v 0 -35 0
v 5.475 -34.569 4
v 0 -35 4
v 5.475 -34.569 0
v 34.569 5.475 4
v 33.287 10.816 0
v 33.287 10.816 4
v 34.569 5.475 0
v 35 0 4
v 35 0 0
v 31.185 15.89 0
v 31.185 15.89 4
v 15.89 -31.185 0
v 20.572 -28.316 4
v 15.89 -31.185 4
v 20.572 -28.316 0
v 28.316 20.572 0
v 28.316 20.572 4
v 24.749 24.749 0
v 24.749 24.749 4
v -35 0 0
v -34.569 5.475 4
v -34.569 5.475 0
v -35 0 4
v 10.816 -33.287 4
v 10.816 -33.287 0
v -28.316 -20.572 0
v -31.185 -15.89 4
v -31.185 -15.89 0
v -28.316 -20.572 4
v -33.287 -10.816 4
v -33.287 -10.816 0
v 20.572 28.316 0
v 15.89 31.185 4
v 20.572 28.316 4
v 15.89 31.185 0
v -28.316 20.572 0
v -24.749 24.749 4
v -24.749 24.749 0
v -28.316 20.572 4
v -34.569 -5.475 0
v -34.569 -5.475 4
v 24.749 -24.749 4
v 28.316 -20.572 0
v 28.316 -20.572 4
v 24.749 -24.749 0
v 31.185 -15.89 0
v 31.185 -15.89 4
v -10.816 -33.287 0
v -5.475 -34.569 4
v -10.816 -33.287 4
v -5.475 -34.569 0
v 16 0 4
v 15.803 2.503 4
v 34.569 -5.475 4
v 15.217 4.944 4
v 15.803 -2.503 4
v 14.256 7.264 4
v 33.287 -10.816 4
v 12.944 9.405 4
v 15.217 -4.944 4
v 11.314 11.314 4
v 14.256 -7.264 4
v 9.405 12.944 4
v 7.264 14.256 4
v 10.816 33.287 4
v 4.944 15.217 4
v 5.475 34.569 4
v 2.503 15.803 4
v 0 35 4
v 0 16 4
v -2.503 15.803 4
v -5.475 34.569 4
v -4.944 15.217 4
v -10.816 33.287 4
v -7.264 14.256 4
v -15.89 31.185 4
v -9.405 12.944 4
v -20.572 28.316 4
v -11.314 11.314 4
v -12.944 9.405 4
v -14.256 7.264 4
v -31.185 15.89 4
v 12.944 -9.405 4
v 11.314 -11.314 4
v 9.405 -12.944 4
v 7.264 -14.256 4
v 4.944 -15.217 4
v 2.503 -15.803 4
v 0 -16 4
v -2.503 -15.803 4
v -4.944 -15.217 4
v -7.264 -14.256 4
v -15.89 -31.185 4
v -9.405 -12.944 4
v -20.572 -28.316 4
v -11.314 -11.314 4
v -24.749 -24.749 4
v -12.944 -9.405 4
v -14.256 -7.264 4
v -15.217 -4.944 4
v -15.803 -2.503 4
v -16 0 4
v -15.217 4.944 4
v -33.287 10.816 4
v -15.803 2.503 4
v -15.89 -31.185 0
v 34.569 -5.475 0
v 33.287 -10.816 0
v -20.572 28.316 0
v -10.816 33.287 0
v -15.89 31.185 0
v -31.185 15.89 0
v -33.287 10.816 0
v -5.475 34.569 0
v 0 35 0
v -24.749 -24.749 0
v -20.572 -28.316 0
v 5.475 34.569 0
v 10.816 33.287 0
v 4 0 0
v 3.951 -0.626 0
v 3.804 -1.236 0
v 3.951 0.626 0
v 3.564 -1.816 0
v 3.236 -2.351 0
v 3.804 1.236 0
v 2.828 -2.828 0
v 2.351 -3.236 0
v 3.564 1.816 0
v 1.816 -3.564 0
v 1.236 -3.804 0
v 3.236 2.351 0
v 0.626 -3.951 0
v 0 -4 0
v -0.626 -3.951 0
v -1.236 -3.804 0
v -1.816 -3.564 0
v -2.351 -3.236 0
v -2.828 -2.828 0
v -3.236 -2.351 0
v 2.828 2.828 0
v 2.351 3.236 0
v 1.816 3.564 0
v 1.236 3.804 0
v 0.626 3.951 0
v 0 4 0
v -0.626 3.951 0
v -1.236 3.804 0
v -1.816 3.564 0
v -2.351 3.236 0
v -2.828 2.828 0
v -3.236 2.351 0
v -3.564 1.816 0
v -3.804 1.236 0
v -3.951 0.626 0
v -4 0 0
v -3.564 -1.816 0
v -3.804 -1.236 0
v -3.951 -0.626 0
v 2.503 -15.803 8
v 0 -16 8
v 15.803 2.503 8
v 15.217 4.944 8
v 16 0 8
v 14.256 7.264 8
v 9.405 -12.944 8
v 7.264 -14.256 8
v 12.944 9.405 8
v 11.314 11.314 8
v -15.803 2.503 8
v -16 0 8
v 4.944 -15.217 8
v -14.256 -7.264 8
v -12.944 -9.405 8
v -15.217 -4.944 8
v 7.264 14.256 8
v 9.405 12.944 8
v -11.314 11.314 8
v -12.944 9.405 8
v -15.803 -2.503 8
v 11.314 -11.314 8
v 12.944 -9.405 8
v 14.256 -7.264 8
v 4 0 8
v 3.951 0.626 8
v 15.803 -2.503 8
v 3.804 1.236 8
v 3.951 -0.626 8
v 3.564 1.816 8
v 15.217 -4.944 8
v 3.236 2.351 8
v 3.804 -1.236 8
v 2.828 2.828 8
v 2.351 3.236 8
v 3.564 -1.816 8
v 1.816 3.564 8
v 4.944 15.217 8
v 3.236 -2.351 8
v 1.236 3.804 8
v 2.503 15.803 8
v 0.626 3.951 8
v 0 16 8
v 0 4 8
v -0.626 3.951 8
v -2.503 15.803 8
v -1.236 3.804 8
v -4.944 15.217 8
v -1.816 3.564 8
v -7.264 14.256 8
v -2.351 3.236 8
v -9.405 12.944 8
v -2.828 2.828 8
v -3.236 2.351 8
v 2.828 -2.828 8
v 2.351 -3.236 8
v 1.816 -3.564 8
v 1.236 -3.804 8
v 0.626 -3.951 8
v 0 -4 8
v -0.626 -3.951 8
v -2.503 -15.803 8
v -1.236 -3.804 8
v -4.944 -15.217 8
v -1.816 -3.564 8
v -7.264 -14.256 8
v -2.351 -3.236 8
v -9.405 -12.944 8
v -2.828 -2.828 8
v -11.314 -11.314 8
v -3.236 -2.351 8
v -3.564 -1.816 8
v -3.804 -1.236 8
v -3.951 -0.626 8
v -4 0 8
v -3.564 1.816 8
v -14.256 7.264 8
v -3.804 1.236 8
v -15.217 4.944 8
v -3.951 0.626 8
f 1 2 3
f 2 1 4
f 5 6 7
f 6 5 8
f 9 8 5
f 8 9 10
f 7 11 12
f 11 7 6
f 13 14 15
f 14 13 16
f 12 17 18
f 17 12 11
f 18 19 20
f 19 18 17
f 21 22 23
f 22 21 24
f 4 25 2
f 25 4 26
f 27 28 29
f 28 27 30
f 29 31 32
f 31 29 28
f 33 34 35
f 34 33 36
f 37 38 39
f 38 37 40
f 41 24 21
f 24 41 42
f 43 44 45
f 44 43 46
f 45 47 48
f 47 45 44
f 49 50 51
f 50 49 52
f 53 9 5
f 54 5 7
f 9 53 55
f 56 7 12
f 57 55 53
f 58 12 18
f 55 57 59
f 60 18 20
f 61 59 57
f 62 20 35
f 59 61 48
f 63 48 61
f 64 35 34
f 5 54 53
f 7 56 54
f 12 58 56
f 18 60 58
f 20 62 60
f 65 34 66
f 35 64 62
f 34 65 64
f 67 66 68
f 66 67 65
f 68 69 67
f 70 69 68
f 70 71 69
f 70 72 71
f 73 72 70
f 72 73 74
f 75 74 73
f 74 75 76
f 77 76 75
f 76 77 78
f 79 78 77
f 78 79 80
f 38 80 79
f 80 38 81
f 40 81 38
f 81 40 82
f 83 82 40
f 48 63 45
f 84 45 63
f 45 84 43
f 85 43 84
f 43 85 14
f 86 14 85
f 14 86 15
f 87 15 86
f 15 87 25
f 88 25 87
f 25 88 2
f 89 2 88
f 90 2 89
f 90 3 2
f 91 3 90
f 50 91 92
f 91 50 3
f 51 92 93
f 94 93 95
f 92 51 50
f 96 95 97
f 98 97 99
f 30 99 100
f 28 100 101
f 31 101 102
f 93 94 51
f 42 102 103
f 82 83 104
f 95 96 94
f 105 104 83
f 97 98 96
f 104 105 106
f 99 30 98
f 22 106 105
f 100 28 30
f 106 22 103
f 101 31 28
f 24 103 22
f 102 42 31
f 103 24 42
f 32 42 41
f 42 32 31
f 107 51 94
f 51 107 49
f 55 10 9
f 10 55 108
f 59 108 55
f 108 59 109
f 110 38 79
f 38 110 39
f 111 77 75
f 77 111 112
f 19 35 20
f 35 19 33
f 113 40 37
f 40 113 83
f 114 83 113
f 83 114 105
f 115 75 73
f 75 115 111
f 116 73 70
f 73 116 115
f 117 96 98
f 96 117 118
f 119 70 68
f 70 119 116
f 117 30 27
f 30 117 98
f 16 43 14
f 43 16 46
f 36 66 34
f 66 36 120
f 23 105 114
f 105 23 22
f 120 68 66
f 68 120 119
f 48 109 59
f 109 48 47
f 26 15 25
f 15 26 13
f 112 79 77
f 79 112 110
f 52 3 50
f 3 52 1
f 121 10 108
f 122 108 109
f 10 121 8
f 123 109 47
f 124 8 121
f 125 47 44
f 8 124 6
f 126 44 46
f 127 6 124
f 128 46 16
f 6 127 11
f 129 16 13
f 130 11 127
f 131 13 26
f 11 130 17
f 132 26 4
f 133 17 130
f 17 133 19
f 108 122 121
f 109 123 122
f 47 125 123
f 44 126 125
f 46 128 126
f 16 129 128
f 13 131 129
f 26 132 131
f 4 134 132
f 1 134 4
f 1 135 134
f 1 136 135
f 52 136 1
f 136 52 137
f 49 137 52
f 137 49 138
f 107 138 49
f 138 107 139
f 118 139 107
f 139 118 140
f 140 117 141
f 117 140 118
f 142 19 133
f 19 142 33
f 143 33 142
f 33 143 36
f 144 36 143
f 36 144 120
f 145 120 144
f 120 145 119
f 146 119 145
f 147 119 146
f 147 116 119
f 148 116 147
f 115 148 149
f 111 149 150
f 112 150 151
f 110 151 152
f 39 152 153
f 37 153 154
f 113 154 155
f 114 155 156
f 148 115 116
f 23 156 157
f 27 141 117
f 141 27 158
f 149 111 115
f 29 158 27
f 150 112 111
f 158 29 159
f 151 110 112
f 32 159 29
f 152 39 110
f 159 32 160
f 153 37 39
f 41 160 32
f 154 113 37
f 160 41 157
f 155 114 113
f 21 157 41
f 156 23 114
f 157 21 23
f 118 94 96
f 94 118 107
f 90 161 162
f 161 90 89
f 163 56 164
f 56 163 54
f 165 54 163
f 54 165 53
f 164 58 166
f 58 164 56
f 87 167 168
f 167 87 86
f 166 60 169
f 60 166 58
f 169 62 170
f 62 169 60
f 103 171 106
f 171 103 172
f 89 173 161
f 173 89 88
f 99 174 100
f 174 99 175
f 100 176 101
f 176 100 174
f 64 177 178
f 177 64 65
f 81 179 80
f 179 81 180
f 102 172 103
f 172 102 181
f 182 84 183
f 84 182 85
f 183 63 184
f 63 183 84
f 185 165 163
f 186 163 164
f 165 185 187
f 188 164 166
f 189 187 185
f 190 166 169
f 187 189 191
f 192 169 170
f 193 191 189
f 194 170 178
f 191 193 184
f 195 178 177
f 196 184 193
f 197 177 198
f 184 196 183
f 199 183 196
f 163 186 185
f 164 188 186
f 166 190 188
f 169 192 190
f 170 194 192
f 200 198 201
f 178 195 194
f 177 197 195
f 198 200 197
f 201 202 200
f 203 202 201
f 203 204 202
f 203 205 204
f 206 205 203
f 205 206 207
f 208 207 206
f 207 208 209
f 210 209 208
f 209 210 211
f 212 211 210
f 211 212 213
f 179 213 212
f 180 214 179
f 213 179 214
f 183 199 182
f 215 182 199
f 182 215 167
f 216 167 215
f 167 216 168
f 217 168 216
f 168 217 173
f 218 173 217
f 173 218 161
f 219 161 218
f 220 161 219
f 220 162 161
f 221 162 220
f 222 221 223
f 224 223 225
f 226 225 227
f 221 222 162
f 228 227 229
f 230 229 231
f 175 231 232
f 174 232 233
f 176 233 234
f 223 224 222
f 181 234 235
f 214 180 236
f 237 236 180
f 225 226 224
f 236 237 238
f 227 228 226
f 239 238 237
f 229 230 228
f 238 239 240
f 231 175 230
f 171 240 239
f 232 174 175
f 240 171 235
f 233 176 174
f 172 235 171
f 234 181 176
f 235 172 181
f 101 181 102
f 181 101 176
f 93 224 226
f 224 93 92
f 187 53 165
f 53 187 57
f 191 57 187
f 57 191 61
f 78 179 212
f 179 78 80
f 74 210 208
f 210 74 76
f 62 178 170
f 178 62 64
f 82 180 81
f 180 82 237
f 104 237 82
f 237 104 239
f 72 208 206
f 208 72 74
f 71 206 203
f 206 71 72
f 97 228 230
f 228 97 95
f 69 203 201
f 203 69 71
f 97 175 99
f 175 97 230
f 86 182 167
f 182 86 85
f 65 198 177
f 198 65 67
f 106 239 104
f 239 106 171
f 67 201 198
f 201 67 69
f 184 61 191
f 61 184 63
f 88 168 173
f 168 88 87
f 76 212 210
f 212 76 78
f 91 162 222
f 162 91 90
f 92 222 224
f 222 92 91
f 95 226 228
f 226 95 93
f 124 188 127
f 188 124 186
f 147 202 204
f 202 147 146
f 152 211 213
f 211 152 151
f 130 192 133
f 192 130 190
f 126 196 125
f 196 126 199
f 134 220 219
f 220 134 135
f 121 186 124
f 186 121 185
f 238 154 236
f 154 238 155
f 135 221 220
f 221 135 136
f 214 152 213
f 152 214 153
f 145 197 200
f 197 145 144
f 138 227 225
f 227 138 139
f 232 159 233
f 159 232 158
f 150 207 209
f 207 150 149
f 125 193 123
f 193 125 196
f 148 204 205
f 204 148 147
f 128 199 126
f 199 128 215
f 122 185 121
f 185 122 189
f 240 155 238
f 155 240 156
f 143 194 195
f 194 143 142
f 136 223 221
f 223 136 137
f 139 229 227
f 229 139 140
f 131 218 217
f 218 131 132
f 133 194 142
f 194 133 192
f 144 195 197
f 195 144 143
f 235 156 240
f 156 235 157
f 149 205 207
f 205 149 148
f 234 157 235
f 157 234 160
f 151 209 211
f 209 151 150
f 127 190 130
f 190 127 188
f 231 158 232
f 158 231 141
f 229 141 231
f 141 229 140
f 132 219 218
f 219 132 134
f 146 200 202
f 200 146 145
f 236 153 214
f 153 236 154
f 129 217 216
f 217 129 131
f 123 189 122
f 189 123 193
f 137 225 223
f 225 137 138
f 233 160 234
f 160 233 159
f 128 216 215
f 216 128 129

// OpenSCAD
//filament holder spindle
//Rick Fray, 3/5/2016

/******** USER VARIABLES ************/
/* Outer hub radius */
outer_radius = 35; // [outer_radius must be > than inner_radius]

/* Inner hub radius - the part that fits in filament reel hole */
inner_radius = 16; // [inner_radius must be < than outer_radius. 28 is close for 1KG reel; 16 for Sainsmart .8kg reel] 

/* Spindle bolt hole radius - 1/4" bolt would be 4 mm */
bolt_radius = 4;

/* Outer hub thickness */
outer_thickness = 4; //outer_thickness must be less than inner_thickness

/* Inner hub thickness */
inner_thickness = 8; //inner_thickness must be less than outer_thickness

difference(){
union(){
cylinder(outer_thickness,outer_radius,outer_radius,$fn=40);
cylinder(inner_thickness,inner_radius,inner_radius,$fn=40);
    }
cylinder (inner_thickness,bolt_radius,bolt_radius,$fn=40);
}
